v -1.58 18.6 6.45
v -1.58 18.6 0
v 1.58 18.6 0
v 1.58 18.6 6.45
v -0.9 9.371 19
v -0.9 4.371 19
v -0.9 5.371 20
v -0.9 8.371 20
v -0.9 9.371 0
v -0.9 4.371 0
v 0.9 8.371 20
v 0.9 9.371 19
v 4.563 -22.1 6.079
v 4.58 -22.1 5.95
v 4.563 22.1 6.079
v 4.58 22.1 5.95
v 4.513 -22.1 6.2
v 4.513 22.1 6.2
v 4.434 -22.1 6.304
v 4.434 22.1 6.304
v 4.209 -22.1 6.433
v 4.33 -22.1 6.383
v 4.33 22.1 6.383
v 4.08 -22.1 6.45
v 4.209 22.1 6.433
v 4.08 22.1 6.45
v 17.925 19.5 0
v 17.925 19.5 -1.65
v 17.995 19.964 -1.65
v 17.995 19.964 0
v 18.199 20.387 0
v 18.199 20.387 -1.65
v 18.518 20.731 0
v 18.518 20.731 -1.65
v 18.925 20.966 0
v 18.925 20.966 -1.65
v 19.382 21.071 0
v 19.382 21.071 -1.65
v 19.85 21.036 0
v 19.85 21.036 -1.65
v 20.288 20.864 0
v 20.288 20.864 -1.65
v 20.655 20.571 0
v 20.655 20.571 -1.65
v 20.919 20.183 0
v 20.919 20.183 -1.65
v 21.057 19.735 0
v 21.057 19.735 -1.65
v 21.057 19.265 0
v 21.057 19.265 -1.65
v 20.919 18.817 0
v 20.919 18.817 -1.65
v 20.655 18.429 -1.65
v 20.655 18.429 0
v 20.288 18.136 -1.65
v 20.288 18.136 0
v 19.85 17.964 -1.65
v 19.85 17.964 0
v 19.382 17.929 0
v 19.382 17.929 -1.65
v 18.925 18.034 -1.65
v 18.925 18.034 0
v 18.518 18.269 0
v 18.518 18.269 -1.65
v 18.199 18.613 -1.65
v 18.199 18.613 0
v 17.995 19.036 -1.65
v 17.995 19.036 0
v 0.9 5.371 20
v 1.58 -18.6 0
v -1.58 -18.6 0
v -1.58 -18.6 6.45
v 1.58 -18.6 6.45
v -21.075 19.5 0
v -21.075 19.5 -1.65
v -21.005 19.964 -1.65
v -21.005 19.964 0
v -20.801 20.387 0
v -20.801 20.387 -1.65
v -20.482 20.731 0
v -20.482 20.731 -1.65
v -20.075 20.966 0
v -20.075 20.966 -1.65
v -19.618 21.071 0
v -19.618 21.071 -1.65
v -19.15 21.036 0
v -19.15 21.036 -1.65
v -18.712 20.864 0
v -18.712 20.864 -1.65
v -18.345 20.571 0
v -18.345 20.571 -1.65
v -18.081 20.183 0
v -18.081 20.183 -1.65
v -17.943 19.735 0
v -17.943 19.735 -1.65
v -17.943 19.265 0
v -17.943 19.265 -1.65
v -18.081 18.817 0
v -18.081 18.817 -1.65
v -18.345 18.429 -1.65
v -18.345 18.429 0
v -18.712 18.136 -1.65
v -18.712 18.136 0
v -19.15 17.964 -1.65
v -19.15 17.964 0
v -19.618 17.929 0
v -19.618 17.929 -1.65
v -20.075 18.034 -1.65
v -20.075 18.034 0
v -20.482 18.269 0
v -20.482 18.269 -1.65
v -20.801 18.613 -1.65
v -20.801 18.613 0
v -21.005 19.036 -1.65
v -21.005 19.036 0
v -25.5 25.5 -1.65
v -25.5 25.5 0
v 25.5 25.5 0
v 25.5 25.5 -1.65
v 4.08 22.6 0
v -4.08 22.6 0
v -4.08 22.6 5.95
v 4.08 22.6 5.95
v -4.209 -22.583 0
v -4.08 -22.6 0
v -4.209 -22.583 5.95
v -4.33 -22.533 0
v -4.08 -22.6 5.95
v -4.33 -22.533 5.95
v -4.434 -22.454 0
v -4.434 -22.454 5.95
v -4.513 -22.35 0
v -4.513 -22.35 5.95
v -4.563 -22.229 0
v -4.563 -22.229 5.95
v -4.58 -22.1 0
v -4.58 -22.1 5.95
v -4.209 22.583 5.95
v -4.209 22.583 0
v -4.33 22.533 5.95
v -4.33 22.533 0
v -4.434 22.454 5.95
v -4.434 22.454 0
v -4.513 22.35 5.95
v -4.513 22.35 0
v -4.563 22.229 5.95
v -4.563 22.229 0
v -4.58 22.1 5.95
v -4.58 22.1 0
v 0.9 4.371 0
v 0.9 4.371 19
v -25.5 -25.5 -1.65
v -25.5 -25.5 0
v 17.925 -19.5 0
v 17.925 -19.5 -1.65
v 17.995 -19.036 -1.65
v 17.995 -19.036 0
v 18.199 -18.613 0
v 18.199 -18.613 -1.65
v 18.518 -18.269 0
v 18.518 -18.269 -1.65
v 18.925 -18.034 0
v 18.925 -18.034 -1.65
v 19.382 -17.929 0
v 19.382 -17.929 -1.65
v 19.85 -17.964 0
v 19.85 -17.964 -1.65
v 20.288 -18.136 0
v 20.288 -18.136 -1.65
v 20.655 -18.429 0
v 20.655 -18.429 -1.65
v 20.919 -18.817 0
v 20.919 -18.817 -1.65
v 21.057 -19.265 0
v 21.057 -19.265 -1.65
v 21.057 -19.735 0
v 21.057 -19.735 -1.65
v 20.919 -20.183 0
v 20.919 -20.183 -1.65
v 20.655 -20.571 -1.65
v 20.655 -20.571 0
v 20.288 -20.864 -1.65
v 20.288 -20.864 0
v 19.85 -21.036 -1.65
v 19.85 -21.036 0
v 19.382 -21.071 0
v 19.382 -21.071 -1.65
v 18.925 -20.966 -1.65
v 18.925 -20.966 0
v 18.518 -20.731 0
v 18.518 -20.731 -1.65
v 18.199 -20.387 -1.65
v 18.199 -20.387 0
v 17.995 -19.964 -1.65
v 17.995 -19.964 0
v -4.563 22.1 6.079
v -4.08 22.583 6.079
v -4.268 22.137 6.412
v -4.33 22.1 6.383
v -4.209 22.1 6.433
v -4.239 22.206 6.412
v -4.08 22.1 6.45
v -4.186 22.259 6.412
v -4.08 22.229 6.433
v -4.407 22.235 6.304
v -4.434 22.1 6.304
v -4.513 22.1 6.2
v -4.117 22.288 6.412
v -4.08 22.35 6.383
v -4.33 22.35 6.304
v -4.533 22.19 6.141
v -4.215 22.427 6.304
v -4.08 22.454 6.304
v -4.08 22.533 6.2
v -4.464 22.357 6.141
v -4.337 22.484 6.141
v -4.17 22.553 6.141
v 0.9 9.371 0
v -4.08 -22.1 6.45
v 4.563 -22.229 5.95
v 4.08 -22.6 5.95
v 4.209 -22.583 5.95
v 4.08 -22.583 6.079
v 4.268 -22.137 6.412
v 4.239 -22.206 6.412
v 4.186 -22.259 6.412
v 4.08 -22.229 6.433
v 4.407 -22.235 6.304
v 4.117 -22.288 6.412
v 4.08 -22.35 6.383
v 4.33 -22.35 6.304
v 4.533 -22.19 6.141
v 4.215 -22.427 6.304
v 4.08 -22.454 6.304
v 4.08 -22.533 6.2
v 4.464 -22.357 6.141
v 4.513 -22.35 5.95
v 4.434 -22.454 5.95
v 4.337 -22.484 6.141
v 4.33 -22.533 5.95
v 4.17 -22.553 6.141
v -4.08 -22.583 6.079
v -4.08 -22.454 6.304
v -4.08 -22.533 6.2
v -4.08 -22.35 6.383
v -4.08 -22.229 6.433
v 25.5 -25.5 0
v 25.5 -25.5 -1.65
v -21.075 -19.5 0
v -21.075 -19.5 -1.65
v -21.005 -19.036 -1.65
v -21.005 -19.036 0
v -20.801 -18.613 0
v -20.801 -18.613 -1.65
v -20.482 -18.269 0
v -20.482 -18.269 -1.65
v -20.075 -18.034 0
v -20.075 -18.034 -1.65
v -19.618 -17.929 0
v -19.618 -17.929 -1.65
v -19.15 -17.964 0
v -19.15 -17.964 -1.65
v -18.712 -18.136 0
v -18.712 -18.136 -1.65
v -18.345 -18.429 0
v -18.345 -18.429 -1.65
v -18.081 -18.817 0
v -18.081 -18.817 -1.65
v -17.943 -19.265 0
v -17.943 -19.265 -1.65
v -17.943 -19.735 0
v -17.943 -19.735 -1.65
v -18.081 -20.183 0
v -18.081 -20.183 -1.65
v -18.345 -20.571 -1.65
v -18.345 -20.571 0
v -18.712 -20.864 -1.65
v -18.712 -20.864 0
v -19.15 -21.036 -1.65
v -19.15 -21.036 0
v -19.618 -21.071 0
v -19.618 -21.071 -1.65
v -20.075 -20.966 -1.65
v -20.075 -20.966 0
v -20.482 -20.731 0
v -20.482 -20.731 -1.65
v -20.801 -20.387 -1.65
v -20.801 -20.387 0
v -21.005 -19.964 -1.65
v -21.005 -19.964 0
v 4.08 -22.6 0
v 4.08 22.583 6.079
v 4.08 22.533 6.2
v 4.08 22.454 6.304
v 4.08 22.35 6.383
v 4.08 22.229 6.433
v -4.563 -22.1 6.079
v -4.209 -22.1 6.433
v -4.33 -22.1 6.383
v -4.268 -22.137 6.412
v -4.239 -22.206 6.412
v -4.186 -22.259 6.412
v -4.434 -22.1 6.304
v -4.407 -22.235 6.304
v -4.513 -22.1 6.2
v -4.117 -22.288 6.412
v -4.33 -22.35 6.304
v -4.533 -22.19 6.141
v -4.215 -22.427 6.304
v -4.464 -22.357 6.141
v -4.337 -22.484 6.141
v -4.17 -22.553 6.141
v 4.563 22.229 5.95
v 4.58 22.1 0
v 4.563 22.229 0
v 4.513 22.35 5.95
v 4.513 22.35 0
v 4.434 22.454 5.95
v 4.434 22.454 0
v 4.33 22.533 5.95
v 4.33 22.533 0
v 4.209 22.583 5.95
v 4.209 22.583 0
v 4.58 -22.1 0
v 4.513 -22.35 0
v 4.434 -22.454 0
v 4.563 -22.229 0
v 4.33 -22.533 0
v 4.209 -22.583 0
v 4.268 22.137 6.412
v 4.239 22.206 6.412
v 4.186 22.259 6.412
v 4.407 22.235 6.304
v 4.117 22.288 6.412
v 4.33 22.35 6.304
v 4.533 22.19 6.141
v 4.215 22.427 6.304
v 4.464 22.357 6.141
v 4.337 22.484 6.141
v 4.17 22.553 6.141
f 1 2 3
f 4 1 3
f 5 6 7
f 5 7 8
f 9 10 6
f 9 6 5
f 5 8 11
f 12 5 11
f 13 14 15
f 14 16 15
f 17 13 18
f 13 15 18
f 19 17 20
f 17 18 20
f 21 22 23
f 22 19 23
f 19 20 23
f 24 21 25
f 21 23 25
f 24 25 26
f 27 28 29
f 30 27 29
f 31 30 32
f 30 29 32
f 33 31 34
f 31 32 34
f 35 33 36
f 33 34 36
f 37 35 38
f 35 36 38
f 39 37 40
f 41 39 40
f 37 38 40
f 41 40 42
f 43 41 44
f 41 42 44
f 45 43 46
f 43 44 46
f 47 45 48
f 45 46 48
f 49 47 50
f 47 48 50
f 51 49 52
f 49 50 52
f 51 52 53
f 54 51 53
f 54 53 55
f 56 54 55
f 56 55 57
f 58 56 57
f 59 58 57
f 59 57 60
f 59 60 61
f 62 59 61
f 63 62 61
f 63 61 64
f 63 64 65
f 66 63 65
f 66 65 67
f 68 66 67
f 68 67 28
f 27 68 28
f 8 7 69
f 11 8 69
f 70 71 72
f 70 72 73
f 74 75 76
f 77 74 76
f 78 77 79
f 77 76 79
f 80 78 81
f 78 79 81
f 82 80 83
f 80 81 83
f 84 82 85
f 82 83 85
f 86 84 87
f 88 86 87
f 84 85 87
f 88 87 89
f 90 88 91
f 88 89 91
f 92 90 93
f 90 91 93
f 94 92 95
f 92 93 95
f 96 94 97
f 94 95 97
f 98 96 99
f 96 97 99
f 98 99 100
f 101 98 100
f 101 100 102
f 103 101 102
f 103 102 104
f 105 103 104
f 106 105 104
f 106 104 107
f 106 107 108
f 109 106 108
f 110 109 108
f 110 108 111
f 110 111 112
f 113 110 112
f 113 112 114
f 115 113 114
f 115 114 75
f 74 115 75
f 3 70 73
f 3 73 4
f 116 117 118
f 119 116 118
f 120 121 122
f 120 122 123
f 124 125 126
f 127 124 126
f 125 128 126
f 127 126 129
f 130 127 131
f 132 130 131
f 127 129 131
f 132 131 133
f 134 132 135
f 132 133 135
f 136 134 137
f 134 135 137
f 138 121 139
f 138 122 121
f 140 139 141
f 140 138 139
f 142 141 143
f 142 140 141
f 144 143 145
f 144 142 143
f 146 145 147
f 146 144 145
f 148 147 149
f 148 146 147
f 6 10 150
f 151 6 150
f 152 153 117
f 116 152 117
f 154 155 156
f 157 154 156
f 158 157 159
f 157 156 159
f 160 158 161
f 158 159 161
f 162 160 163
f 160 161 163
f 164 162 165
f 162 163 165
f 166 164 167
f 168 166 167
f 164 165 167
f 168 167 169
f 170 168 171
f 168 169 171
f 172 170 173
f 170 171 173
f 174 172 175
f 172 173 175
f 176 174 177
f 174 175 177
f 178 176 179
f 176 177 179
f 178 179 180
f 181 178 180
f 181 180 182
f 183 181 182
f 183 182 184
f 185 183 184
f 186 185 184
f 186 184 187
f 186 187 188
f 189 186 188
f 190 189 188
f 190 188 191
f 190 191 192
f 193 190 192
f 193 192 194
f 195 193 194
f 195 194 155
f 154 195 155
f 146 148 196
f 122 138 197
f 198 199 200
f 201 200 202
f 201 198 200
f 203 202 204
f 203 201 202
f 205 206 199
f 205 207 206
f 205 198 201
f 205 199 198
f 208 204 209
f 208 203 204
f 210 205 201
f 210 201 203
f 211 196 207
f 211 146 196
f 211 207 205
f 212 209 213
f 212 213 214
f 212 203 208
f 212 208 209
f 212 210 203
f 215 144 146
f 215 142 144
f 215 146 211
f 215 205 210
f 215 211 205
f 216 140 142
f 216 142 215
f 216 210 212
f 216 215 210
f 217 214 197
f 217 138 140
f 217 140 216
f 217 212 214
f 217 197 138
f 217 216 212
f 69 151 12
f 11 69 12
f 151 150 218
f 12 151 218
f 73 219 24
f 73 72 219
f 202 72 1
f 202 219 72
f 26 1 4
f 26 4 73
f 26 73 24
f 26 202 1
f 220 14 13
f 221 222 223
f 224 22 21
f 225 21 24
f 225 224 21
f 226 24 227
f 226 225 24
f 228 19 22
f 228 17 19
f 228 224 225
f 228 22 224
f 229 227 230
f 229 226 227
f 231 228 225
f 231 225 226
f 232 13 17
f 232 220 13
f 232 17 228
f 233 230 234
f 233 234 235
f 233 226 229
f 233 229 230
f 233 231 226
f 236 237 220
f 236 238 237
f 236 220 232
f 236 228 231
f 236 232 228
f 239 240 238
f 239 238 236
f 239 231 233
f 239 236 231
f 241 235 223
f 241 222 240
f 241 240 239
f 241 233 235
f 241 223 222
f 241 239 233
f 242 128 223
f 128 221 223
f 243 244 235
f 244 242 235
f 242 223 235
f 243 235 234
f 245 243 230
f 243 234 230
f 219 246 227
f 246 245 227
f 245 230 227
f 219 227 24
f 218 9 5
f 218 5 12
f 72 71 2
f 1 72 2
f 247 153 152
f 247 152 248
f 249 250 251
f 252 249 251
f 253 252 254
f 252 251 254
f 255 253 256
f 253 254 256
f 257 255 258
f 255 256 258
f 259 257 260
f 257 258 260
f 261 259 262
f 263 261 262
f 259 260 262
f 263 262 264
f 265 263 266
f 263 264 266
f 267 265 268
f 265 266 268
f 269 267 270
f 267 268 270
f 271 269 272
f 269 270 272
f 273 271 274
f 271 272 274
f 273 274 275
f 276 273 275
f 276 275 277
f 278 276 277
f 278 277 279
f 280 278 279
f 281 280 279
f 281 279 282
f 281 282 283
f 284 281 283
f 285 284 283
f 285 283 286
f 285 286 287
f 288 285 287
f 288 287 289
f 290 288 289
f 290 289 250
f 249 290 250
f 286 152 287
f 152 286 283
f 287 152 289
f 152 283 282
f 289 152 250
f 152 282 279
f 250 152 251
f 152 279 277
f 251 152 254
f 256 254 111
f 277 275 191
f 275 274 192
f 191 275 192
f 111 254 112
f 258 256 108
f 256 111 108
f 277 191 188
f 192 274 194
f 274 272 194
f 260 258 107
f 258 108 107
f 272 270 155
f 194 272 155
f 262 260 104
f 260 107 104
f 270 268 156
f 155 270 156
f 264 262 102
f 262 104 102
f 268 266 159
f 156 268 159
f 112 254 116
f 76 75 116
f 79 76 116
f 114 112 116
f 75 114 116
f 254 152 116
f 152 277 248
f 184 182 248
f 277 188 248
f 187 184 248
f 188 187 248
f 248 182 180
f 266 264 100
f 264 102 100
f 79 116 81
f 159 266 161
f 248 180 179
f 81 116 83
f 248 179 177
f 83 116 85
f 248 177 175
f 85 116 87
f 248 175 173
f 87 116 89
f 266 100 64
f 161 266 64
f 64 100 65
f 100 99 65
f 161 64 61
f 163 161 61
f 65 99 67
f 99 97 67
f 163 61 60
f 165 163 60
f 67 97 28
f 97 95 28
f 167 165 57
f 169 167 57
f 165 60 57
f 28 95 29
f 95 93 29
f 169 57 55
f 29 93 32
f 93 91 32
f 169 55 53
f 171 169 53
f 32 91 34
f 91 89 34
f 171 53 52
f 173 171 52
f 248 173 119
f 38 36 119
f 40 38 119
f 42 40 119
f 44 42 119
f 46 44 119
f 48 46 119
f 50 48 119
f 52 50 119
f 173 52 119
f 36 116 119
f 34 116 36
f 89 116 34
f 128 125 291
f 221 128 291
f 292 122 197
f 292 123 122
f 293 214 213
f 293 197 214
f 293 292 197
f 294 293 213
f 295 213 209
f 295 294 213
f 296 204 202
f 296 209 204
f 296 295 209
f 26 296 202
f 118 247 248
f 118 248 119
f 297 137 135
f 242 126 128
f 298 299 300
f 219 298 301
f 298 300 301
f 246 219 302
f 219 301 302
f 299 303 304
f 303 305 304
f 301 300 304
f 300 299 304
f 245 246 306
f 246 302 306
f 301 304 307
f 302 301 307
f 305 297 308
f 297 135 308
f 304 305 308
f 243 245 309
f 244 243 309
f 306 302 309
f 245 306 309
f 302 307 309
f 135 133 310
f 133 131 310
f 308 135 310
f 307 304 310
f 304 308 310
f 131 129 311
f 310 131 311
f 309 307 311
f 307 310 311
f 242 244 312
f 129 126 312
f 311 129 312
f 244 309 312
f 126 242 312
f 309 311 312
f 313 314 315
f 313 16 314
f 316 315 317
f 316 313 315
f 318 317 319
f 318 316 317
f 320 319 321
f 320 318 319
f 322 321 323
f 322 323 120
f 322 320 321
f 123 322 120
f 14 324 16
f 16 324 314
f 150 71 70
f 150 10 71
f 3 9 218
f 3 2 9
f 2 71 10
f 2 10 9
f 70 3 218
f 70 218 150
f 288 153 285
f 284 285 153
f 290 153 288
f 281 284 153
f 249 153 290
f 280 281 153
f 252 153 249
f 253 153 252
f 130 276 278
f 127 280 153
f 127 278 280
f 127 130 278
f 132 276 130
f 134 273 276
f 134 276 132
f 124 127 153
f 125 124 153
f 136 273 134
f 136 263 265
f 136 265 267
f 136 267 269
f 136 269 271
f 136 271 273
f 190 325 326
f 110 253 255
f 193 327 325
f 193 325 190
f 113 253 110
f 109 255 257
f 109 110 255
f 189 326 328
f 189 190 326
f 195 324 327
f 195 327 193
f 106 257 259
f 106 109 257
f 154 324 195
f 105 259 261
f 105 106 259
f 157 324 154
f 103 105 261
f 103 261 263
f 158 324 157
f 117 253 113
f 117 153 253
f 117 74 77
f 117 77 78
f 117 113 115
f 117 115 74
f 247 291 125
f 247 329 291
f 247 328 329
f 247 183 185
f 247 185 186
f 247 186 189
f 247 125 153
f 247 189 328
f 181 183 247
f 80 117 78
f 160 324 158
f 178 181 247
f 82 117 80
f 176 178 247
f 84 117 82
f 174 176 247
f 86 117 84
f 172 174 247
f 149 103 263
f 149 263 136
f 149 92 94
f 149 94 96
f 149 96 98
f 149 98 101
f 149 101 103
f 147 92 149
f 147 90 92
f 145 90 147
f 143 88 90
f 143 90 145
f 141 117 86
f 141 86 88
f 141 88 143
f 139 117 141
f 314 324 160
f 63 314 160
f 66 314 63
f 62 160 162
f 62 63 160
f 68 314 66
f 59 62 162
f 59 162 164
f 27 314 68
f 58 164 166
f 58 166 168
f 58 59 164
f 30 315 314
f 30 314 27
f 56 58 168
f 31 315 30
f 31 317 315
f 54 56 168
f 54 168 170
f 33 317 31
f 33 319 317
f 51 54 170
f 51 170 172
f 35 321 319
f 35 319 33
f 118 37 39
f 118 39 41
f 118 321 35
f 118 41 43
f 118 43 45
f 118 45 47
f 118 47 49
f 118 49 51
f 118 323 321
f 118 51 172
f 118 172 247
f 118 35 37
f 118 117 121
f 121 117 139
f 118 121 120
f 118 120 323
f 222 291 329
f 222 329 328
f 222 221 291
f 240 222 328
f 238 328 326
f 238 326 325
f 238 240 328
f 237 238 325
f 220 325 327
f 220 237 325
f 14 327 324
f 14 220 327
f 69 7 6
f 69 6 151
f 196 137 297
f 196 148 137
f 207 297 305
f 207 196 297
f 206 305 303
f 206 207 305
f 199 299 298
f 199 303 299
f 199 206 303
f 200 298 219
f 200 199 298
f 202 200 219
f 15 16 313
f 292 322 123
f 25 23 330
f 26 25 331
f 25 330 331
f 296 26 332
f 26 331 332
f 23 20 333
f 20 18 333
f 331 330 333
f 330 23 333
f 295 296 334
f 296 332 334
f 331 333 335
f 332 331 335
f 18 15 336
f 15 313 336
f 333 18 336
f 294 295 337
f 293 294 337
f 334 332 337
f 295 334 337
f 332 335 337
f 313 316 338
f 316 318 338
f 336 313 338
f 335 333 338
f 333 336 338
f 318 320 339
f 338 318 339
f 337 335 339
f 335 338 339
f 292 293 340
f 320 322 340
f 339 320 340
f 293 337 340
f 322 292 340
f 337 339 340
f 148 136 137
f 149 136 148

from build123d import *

# Parameters (mm, degrees)
F0_W     = 51
F0_H     = 51
F3_DEPTH = 1.65
F4_D     = 3.15
F1_W     = 9.16
F1_H     = 45.2
F1_W_2   = 3.16
F1_H_2   = 37.2
F5_DEPTH = 6.45
F6_R     = 0.5
F2_W     = 1.8
F2_H     = 5
F7_DEPTH = 20
F8_SIZE  = 1


with BuildPart() as f3:
    # F0 (on Top) → F3 (new body)
    with BuildSketch(Plane.XY):
        Rectangle(F0_W, F0_H)
    extrude(amount=-F3_DEPTH)

    # F4 (through all)
    with Locations(Plane.XY):
        with Locations((-19.5, 19.5), (19.5, 19.5), (19.5, -19.5), (-19.5, -19.5)):
            Hole(F4_D / 2)

    # F1 (on Top) → F5 (join)
    with BuildSketch(Plane.XY):
        Rectangle(F1_W, F1_H)
        Rectangle(F1_W_2, F1_H_2, mode=Mode.SUBTRACT)
    extrude(amount=F5_DEPTH)

    # F6
    f6_edges = [f3.edges().sort_by_distance(p)[0] for p in [
        (4.58, 22.6, 3.225),
        (-4.58, 22.6, 3.225),
        (4.58, -22.6, 3.225),
        (-4.58, -22.6, 3.225),
        (4.58, 0, 6.45),
        (-4.58, 0, 6.45),
        (0, -22.6, 6.45),
        (0, 22.6, 6.45),
    ]]
    fillet(f6_edges, radius=F6_R)

    # F2 (on Top) → F7 (join)
    with BuildSketch(Plane.XY):
        with Locations((0, 6.87148829)):
            Rectangle(F2_W, F2_H)
    extrude(amount=F7_DEPTH)

    # F8
    f8_edges = [f3.edges().sort_by_distance(p)[0] for p in [
        (0, 4.371488, 20),
        (0, 9.371488, 20),
    ]]
    chamfer(f8_edges, length=F8_SIZE)


solid = f3.part
